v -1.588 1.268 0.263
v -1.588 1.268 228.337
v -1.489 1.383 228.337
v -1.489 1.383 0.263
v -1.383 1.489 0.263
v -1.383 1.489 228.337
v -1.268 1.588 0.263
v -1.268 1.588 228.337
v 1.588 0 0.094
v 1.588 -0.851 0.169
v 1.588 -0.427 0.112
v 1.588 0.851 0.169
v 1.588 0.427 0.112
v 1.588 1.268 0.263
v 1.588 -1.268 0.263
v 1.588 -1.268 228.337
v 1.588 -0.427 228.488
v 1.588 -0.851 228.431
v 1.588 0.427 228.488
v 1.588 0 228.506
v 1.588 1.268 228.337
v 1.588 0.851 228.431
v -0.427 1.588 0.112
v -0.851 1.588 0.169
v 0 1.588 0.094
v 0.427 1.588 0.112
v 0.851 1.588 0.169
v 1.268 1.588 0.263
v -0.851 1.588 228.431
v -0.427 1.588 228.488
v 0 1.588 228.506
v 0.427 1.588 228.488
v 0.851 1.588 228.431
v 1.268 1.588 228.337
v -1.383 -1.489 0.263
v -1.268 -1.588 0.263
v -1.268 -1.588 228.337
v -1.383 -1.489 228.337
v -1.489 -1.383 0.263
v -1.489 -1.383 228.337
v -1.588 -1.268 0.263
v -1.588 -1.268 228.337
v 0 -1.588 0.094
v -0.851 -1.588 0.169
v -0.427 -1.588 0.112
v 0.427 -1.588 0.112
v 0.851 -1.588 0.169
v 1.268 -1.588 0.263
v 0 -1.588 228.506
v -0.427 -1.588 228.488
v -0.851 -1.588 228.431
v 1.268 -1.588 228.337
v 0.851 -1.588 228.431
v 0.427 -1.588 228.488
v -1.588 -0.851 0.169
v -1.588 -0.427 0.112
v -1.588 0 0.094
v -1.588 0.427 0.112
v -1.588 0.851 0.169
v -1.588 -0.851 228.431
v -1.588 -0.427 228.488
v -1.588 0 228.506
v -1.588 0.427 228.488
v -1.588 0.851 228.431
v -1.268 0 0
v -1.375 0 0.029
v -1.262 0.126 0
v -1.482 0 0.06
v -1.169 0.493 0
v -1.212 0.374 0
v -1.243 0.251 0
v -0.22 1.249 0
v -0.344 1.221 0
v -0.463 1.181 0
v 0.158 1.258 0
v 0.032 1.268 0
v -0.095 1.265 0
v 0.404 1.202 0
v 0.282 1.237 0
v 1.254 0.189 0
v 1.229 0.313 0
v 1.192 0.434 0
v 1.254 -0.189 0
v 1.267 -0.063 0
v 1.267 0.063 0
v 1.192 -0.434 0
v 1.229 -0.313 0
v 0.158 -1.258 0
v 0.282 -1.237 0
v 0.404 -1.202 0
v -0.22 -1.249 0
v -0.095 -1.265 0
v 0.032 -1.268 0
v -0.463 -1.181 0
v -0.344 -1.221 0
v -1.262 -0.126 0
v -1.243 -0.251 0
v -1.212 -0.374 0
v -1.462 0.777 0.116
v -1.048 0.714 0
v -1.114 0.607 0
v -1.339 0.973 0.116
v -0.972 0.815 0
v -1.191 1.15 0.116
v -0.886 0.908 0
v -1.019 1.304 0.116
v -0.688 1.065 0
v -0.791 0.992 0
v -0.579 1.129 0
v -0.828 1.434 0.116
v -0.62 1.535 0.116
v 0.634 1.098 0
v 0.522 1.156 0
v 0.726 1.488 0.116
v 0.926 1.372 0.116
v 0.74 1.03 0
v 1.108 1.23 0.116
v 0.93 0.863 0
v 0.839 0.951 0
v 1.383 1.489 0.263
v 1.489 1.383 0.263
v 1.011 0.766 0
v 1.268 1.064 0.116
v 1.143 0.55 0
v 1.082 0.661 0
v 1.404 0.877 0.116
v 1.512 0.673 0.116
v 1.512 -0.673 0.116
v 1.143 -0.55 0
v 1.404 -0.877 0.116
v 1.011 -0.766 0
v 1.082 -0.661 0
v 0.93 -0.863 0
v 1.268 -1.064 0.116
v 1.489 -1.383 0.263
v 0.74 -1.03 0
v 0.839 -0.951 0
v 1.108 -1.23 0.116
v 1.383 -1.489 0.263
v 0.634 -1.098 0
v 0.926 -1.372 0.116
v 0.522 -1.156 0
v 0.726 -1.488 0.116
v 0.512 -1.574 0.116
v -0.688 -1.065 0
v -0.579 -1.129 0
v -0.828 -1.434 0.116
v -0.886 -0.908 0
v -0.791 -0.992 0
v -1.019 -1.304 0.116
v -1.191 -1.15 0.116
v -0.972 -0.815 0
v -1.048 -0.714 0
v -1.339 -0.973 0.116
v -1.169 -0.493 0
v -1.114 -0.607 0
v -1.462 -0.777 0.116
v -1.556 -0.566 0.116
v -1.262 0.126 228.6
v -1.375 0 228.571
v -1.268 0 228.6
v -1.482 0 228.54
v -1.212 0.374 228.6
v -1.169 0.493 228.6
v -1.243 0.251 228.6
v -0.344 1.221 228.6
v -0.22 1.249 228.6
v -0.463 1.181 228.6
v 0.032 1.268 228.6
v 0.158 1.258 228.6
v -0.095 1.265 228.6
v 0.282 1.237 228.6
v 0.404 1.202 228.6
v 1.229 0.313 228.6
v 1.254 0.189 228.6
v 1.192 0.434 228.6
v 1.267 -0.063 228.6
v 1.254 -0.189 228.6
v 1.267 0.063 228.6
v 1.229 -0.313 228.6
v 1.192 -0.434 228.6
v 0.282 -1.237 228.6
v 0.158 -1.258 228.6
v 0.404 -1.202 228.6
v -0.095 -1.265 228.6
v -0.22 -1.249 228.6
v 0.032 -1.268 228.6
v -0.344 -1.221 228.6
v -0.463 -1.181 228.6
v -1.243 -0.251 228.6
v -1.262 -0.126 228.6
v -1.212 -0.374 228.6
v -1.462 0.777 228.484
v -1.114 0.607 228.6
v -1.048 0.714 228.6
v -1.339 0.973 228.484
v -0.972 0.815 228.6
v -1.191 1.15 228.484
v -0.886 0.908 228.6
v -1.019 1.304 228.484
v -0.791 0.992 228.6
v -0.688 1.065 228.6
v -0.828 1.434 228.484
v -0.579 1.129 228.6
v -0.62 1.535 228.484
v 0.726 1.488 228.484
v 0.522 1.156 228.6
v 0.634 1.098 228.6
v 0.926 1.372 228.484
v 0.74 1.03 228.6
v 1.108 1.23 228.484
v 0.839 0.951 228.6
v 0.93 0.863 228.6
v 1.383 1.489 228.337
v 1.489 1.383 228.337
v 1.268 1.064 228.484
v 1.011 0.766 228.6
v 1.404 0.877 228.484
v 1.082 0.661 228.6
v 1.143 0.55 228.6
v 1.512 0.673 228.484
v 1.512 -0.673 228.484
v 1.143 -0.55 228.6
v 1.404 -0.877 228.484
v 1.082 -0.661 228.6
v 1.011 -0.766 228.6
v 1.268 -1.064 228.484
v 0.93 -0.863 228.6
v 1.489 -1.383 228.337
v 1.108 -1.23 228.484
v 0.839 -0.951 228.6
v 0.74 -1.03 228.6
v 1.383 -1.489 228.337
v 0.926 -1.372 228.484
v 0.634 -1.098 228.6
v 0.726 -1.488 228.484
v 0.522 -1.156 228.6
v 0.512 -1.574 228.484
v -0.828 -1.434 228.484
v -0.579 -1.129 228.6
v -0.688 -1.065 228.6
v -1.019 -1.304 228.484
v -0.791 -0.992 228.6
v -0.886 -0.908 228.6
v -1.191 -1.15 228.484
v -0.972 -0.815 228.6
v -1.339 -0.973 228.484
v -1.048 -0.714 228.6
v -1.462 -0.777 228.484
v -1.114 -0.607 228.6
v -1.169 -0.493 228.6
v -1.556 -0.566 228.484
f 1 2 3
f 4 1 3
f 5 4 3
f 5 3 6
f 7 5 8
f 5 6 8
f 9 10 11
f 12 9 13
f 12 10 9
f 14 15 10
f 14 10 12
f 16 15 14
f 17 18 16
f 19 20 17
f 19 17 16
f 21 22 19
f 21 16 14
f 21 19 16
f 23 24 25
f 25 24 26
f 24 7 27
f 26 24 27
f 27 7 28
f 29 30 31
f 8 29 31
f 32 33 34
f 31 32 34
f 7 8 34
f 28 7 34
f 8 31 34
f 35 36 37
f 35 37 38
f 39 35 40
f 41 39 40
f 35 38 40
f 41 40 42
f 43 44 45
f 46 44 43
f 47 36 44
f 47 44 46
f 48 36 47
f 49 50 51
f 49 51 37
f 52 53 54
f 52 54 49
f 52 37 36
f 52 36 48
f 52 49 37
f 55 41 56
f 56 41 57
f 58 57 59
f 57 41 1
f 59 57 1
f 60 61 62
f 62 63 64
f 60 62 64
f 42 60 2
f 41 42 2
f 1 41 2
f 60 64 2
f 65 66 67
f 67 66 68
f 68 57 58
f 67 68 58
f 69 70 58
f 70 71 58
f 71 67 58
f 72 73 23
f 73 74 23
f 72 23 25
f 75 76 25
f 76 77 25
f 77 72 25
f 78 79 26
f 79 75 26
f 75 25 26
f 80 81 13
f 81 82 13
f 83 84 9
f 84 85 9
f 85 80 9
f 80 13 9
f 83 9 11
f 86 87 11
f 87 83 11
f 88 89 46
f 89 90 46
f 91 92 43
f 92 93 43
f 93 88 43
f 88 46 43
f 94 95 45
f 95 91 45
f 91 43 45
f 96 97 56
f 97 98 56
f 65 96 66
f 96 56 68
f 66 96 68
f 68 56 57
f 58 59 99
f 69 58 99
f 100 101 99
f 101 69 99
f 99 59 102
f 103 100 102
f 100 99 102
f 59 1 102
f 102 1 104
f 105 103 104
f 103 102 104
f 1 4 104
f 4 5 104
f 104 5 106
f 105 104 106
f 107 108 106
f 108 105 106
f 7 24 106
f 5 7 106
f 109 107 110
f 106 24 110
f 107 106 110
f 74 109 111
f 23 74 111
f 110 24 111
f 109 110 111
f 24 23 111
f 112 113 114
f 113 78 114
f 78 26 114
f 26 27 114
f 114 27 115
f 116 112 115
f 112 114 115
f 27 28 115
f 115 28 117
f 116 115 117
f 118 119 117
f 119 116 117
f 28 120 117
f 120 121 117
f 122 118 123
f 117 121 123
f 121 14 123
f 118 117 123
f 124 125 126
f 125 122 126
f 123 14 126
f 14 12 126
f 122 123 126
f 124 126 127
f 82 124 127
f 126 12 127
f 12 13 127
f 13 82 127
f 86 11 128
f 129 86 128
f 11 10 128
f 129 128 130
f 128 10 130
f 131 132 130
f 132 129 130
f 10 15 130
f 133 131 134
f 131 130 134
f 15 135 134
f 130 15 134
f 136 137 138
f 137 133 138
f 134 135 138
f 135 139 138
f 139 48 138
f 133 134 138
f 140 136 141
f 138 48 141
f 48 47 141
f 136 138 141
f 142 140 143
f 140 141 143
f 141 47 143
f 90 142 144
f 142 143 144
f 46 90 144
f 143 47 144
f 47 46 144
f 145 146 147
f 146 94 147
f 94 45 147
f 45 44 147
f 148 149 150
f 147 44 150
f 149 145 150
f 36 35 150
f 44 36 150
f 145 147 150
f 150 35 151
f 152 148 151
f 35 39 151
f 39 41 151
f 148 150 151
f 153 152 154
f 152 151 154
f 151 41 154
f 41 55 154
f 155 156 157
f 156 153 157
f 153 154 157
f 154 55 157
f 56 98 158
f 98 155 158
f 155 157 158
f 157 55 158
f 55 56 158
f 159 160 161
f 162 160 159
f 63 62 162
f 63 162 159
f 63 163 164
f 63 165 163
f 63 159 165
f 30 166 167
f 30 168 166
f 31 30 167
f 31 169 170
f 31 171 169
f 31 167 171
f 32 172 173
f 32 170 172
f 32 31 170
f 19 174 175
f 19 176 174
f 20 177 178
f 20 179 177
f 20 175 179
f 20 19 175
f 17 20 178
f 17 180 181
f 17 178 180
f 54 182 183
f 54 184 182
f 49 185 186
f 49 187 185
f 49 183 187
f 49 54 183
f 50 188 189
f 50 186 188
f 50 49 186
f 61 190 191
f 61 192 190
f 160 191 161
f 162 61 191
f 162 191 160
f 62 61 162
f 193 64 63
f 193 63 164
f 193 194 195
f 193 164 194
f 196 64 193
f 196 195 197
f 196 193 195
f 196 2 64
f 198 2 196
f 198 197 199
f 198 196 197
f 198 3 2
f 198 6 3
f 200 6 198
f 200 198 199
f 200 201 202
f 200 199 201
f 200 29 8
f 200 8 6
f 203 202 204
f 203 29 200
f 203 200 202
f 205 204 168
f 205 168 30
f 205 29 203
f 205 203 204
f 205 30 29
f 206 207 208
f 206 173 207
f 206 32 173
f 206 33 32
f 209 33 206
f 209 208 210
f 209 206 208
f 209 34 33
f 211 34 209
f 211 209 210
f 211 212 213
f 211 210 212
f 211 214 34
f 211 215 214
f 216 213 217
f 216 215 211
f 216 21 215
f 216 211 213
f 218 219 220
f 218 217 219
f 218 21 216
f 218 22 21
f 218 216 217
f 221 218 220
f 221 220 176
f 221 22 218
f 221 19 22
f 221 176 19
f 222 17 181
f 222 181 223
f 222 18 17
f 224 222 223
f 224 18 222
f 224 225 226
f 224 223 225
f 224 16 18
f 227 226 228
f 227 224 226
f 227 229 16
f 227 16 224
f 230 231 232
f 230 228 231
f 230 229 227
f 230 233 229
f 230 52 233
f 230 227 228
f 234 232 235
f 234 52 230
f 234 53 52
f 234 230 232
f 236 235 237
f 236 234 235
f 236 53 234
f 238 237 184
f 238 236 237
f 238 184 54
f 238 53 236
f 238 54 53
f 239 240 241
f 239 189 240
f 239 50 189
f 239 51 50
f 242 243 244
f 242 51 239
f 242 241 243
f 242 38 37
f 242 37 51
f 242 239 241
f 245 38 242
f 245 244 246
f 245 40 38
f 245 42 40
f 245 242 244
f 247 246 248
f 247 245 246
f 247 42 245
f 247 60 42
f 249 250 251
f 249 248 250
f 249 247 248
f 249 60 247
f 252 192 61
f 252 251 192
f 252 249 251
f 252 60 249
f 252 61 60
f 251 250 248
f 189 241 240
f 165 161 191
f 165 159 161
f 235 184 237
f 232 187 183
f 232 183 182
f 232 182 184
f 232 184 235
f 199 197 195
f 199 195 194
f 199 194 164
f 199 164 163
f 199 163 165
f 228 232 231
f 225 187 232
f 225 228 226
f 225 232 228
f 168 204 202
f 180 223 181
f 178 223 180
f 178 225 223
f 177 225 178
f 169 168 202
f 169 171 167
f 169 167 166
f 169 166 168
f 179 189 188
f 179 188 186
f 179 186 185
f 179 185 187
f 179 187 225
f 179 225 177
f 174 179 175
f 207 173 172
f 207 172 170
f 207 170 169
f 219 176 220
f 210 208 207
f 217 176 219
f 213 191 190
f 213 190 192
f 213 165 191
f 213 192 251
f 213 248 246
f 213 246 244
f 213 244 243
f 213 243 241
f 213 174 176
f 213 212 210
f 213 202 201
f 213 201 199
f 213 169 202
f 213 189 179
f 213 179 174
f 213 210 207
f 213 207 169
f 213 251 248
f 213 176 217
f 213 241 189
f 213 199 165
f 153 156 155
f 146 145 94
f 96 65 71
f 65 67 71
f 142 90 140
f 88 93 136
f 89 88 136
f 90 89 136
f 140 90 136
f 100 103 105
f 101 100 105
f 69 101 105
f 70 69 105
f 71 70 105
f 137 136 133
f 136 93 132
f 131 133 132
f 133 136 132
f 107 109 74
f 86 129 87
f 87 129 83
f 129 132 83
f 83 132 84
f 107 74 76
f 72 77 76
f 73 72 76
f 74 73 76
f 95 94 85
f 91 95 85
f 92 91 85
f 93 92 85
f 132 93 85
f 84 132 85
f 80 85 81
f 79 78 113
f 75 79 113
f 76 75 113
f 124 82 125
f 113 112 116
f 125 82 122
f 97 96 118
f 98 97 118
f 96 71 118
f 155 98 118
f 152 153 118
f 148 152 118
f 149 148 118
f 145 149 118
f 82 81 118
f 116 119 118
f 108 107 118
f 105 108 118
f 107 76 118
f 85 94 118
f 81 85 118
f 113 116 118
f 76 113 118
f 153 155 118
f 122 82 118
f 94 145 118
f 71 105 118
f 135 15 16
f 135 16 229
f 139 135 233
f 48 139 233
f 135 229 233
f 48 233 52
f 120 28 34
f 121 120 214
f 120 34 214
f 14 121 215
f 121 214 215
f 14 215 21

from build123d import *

# Parameters (mm, degrees)
SKETCH1_W           = 3.175
SKETCH1_H           = 3.175
BOSS_EXTRUDE1_DEPTH = 114.3
SKETCH2_OUTSIDE_W   = 28.054
SKETCH2_OUTSIDE_H   = 28.054
SKETCH2_OUTSIDE_R   = 2.032
CUT_EXTRUDE1_DEPTH  = 115.3


with BuildPart() as part:
    # Sketch1 → Boss-Extrude1 (new body)
    with BuildSketch(Plane.XY):
        Rectangle(SKETCH1_W, SKETCH1_H)
    extrude(amount=BOSS_EXTRUDE1_DEPTH)

    # Sketch2 outside → Cut-Extrude1 (cut, through all)
    with BuildSketch(Plane(origin=(0, 0, 0), x_dir=(-1, 0, 0), z_dir=(0, 0, -1))):
        Rectangle(SKETCH2_OUTSIDE_W, SKETCH2_OUTSIDE_H)
        Circle(SKETCH2_OUTSIDE_R, mode=Mode.SUBTRACT)
    extrude(amount=-CUT_EXTRUDE1_DEPTH, mode=Mode.SUBTRACT)

    # Sketch3 → Cut-Revolve1 (revolve, cut)
    with BuildSketch(Plane(origin=(0, 0, 0), x_dir=(1, 0, 0), z_dir=(0, 1, 0))):
        with BuildLine():
            Line((-5.053685963, -4.40273269), (-5.053685963, 5.740530545))
            Line((-5.053685963, 5.740530545), (0, 5.740530545))
            Line((0, 5.740530545), (0, 0.160877736))
            ThreePointArc((0, 0.160877736), (-3.404639553, -1.148866368), (-5.053685963, -4.40273269))
        make_face()
    revolve(axis=Axis((0, 0, 114.3), (0, 0, -1)), mode=Mode.SUBTRACT)

    # Mirror1: part across plane


with BuildPart() as part_1:
    add(part.part)
    add(part.part.mirror(Plane(origin=(0, 0, 114.3), x_dir=(1, 0, 0), z_dir=(0, 0, -1))))


solid = part_1.part
